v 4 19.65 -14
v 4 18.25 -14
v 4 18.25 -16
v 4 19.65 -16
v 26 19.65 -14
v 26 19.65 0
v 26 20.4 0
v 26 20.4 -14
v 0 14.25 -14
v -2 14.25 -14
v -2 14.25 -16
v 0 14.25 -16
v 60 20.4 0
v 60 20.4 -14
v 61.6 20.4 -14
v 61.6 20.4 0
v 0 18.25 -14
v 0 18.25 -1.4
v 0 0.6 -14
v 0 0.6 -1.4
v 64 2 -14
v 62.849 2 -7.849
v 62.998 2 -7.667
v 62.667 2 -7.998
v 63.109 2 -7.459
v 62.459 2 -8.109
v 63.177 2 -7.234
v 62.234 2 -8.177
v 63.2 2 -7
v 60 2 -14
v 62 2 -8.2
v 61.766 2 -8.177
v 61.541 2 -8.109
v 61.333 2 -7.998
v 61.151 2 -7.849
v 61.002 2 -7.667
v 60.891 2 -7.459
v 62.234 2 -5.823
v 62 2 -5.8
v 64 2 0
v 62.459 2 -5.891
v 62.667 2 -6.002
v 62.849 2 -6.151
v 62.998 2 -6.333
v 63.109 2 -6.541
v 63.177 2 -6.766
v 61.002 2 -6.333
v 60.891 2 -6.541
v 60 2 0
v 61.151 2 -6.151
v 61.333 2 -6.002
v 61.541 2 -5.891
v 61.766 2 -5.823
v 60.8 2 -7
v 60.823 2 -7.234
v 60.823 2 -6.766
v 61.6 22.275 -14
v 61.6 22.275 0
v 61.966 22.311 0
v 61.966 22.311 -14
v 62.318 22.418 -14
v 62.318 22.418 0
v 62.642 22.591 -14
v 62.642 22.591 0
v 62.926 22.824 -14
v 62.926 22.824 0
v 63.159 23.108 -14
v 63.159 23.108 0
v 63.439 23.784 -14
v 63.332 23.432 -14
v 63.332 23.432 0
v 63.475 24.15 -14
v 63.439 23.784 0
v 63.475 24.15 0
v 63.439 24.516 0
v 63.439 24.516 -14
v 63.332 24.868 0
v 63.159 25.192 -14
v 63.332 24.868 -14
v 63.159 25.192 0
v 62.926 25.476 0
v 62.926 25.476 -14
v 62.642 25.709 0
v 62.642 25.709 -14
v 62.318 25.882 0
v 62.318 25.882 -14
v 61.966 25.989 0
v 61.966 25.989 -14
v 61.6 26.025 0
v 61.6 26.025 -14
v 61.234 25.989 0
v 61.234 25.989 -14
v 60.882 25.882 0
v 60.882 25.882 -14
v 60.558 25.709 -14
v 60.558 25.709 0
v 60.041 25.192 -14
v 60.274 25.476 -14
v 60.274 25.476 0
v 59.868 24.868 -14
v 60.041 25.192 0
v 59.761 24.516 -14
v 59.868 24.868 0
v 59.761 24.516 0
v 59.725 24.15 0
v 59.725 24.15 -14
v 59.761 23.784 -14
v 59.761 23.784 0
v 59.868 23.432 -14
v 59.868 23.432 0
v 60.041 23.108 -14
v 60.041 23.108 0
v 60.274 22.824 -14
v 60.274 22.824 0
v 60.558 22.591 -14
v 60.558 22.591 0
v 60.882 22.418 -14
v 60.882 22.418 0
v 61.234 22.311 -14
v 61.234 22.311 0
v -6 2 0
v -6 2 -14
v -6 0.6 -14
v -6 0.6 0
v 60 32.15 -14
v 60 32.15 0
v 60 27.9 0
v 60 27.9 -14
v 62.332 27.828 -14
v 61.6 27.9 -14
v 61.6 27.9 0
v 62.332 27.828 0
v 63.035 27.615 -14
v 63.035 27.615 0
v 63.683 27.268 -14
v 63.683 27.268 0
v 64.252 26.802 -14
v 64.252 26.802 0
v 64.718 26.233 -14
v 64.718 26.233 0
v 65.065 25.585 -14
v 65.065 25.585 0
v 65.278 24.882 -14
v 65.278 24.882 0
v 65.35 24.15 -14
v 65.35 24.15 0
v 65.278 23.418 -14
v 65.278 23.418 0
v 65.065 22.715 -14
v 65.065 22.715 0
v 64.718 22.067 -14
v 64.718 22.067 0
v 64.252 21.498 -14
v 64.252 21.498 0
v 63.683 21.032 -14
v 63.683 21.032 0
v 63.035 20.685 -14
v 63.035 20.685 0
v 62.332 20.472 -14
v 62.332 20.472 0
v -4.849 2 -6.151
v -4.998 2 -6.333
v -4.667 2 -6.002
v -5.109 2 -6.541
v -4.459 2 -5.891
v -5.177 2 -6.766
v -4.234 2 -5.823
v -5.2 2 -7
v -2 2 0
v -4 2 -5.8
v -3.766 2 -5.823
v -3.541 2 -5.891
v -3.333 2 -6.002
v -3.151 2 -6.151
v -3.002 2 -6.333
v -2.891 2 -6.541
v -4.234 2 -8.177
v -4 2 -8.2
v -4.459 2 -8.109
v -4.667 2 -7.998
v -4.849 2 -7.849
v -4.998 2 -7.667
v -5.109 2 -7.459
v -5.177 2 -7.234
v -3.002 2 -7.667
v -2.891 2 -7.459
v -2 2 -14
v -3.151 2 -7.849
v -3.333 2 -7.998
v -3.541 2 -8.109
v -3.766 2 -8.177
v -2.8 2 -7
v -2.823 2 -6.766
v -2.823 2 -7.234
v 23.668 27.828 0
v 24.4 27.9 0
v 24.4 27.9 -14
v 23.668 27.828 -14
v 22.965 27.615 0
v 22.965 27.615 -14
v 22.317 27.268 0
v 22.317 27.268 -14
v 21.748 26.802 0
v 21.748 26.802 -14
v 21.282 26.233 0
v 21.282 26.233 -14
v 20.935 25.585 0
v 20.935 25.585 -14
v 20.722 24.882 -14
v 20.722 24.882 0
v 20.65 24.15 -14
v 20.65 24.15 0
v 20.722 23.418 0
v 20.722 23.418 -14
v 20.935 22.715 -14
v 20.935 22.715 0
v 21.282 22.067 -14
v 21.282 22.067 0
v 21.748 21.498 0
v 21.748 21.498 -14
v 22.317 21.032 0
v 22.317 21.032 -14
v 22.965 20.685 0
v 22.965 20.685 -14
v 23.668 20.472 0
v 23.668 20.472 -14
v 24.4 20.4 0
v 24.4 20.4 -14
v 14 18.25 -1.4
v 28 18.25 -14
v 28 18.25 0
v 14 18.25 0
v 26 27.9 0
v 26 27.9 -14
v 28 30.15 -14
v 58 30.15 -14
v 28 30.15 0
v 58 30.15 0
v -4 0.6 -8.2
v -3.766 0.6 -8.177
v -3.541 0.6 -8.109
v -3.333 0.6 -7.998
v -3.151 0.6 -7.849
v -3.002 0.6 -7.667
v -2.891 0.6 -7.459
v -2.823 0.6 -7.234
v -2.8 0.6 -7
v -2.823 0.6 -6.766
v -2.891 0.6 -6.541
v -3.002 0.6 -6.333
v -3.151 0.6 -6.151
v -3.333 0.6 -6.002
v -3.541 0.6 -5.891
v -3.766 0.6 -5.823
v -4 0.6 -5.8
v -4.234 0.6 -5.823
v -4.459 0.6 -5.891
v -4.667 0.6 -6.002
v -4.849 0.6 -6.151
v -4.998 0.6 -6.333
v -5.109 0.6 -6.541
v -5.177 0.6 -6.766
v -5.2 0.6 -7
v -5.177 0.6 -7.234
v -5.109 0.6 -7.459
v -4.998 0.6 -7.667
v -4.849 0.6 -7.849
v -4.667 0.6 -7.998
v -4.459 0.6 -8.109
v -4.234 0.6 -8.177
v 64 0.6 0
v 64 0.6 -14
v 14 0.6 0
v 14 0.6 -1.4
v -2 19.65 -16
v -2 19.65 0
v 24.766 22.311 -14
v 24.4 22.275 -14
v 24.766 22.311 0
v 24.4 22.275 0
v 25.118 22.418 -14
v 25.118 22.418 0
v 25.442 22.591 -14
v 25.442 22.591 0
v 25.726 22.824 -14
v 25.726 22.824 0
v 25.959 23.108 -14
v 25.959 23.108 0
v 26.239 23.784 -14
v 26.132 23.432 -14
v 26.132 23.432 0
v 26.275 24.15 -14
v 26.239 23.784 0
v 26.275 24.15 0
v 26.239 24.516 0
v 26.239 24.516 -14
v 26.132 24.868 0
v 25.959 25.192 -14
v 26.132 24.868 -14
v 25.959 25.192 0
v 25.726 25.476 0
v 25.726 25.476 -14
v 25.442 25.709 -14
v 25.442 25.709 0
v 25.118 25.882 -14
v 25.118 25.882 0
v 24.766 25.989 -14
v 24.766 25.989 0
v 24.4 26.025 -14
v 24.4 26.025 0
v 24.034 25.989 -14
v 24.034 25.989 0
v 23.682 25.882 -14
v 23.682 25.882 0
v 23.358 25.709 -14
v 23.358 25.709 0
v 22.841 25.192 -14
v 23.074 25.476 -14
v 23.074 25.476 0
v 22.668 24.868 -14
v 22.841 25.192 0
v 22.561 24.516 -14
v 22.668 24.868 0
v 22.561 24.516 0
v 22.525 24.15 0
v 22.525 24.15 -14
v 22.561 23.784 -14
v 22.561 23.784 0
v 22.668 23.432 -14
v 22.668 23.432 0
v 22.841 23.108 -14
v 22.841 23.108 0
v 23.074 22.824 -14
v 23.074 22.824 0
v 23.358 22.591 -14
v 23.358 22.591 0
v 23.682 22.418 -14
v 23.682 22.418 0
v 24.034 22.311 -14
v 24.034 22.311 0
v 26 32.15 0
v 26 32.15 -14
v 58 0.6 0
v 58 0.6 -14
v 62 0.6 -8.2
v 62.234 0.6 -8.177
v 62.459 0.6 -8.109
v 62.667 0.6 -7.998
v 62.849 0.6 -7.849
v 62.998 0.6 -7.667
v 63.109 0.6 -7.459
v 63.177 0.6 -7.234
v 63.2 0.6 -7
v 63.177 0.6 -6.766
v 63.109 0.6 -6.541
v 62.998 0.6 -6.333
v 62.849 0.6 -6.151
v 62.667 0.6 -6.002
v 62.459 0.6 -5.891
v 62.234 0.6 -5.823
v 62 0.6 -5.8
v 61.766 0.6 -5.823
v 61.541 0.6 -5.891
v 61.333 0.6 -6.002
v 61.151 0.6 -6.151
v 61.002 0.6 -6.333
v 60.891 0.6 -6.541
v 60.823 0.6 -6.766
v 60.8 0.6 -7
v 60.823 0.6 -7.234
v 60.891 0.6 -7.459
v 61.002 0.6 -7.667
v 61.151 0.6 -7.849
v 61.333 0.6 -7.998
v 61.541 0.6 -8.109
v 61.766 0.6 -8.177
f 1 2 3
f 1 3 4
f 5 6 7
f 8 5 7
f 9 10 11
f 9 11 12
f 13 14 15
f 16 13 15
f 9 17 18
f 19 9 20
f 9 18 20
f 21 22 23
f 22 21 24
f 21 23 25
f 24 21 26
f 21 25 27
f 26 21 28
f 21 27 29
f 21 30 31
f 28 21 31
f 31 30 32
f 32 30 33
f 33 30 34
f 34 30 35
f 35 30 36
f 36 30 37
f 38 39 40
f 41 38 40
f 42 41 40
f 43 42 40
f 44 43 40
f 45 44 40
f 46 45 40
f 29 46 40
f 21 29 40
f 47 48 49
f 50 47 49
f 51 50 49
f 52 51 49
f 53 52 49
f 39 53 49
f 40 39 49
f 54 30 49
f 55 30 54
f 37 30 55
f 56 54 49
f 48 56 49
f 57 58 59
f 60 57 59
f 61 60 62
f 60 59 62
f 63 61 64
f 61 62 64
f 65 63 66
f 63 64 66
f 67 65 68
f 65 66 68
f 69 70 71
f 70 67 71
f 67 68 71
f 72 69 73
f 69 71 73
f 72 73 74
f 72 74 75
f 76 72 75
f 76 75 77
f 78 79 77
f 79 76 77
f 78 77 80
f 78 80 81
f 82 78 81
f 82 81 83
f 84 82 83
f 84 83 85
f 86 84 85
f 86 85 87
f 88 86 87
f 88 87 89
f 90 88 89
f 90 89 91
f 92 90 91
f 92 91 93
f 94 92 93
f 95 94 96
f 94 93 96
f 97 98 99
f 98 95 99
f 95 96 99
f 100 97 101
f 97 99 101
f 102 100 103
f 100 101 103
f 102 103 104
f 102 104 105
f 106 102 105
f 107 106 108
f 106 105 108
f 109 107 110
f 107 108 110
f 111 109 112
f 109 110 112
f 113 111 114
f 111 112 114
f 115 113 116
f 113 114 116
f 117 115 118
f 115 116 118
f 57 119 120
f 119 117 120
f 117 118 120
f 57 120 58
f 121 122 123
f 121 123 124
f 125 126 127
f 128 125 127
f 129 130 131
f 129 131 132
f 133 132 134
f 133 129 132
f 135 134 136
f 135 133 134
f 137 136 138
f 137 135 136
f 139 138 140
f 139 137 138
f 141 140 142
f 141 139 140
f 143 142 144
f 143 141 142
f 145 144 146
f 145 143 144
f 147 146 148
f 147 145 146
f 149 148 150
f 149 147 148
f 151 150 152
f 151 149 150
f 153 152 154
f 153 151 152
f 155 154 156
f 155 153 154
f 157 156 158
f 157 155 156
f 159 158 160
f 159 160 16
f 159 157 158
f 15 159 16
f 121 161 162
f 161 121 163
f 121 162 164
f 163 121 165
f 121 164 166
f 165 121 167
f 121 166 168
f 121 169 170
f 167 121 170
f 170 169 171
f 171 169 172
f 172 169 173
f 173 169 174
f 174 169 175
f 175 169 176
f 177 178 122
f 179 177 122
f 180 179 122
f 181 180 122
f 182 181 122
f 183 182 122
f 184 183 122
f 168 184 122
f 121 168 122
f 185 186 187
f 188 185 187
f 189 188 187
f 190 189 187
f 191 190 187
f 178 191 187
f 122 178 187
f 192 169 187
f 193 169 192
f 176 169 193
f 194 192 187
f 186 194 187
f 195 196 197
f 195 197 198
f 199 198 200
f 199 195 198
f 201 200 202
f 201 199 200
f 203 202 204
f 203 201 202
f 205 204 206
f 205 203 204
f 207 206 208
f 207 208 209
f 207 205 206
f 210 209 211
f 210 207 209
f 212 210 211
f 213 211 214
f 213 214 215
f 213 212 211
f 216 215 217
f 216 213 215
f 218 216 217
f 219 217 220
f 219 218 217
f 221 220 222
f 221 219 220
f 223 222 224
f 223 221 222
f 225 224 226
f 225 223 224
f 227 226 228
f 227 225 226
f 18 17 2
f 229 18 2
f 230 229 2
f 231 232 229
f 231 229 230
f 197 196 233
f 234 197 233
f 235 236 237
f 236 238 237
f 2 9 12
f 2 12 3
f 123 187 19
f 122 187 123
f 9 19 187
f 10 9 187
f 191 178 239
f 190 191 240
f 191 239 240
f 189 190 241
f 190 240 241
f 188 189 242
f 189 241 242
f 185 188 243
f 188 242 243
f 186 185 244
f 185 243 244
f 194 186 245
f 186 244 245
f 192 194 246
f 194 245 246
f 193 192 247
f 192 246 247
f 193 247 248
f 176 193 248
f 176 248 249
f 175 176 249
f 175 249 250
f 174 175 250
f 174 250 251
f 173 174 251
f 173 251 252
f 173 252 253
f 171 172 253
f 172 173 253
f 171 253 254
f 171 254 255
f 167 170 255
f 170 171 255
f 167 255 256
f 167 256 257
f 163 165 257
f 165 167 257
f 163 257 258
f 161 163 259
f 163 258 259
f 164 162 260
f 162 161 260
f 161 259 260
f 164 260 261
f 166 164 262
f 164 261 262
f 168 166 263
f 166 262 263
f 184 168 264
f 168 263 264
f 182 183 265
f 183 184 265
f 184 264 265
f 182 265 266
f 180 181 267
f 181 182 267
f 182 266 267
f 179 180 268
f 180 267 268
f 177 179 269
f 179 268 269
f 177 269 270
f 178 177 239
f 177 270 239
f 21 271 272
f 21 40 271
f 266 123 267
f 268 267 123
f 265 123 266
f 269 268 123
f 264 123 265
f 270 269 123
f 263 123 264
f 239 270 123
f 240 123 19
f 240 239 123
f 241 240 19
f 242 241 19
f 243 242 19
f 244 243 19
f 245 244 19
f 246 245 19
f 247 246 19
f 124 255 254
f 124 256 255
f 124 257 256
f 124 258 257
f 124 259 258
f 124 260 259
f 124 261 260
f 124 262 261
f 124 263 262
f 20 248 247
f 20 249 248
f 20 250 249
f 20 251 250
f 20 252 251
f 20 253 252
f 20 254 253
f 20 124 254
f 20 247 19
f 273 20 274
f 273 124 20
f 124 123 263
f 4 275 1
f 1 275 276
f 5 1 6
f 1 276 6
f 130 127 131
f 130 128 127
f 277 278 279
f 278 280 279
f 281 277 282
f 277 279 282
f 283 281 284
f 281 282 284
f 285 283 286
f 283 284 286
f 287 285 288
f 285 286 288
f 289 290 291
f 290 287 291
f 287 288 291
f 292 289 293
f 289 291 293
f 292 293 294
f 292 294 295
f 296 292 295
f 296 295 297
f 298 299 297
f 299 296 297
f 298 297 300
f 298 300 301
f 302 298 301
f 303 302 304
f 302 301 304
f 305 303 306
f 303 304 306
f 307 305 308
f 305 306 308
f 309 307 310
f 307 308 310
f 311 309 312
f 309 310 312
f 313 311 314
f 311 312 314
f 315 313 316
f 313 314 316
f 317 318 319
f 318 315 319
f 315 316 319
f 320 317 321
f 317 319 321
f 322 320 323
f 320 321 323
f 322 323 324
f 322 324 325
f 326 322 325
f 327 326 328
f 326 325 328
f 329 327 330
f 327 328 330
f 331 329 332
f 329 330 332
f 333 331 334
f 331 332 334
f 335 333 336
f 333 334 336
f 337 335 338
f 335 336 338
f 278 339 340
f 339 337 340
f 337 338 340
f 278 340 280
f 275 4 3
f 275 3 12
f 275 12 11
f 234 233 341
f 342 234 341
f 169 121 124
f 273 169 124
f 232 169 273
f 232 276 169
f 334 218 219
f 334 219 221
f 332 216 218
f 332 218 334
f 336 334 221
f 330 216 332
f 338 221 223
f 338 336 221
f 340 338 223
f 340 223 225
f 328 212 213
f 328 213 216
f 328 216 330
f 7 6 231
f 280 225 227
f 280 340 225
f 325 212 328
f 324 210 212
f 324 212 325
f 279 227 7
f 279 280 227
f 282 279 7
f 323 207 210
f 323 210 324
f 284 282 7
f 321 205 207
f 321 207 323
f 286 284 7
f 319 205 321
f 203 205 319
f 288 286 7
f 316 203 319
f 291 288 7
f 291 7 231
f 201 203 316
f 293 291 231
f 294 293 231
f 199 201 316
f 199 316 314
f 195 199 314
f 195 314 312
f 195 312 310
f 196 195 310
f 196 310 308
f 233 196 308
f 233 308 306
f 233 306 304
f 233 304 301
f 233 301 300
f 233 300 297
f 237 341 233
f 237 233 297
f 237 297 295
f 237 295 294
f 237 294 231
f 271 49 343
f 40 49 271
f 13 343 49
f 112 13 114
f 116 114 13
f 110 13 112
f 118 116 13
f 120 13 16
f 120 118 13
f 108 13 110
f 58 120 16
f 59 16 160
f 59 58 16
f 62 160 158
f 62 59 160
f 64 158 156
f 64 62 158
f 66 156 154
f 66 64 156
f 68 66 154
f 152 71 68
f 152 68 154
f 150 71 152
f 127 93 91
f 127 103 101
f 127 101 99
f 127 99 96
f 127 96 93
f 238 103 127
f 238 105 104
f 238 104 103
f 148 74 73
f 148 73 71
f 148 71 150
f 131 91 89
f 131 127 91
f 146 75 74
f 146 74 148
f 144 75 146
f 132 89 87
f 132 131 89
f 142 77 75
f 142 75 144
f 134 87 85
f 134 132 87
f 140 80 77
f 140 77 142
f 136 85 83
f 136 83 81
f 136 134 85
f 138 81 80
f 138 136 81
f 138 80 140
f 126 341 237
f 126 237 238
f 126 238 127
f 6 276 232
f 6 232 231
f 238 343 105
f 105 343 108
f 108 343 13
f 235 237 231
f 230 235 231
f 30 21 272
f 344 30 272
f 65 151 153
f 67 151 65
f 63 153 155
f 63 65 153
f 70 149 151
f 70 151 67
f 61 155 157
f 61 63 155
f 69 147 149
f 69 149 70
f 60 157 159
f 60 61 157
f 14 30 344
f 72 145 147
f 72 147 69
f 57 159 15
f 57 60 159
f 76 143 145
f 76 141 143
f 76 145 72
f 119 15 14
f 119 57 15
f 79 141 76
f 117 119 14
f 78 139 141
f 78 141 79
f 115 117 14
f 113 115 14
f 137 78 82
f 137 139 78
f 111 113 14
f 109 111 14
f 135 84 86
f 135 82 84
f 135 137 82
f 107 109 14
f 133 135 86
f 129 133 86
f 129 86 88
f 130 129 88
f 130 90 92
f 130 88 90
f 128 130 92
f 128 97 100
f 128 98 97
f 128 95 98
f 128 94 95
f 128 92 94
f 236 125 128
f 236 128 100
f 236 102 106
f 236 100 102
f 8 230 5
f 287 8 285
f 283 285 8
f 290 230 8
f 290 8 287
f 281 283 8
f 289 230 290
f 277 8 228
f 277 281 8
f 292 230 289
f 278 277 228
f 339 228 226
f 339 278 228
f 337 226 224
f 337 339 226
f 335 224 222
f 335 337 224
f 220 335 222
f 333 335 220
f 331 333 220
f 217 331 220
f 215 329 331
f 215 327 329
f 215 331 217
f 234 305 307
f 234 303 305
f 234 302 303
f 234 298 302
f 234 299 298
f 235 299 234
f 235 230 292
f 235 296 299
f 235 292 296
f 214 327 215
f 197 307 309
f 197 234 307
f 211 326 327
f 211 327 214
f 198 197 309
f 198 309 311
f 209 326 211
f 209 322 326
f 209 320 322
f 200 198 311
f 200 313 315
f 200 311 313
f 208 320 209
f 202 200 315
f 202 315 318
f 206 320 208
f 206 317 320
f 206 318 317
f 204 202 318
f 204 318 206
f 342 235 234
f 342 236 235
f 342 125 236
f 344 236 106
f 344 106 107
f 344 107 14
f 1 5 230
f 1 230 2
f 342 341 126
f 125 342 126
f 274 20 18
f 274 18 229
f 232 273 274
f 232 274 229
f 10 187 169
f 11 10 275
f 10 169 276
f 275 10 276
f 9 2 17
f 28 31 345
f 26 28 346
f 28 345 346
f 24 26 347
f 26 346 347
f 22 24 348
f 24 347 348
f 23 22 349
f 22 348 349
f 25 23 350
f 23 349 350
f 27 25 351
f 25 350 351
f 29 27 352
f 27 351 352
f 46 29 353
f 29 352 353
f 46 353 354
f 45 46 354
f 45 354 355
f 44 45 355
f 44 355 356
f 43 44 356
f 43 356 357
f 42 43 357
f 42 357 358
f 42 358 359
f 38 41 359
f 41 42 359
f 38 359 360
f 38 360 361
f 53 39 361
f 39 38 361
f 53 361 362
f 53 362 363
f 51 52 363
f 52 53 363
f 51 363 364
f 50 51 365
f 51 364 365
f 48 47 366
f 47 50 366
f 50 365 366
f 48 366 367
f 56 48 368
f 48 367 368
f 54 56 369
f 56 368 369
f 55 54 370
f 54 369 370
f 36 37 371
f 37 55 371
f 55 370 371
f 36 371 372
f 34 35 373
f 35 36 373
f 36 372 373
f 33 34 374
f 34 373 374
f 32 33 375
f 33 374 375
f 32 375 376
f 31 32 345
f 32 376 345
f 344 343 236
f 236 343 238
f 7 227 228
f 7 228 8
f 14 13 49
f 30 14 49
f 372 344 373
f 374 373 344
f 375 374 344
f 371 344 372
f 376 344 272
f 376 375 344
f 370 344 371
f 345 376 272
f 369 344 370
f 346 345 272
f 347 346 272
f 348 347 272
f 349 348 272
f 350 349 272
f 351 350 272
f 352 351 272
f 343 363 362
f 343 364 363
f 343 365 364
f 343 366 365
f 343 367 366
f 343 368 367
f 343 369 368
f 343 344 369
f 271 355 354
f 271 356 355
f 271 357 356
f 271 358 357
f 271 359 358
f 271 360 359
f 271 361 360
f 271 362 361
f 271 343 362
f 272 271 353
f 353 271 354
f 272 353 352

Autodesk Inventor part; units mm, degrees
ref_plane "YZ Plane" through (0, 0, 0) normal (1, 0, 0) x (0, 1, 0)
ref_plane "XZ Plane" through (0, 0, 0) normal (0, 1, 0) x (-1, 0, 0)
ref_plane "XY Plane" through (0, 0, 0) normal (0, 0, 1) x (1, 0, 0)
sketch "スケッチ1" plane through (0, 0, 0) normal (0, 0, 1) x (1, 0, 0)
  line L0 (0, 0) -> (0, 17.65)
  line L1 (0, 17.65) -> (28, 17.65)
  line L2 (28, 17.65) -> (28, 30.15)
  line L3 (28, 30.15) -> (58, 30.15)
  line L4 (58, 30.15) -> (58, 0)
  line L5 (58, 0) -> (60, 0)
  line L6 (60, 0) -> (60, 32.15)
  line L7 (60, 32.15) -> (28, 32.15)
  line L8 (28, 32.15) -> (26, 32.15)
  line L9 (26, 32.15) -> (26, 19.65)
  line L10 (26, 19.65) -> (-2, 19.65)
  line L11 (-2, 19.65) -> (-2, 0)
  line L12 (-2, 0) -> (0, 0)
  dimension "d0" = 17.65
  dimension "d1" = 28
  dimension "d2" = 12.5
  dimension "d3" = 30
  dimension "d4" = 2
  dimension "d5" = 32.15
  dimension "d6" = 32
  dimension "d7" = 2
  dimension "d8" = 12.5
  dimension "d9" = 28
extrude "押し出し1" add sketch "スケッチ1" along normal blind 14
sketch "スケッチ2" plane through (60, 0, 0) normal (1, 0, 0) x (0, 0, -1)
  line L0 (0, 0) -> (-14, 0) projected
  line L1 (-14, 0) -> (0, 0)
  line L2 (0, 0) -> (0, 2)
  line L3 (0, 2) -> (-14, 2)
  line L4 (-14, 2) -> (-14, 0)
  dimension "d12" = 14
  dimension "d13" = 2
extrude "押し出し2" add sketch "スケッチ2" along normal blind 7
sketch "スケッチ3" plane through (-2, 0, 0) normal (-1, 0, 0) x (0, 0, 1)
  line L0 (14, 2) -> (0, 2) projected
  line L1 (0, 0) -> (14, 0)
  line L2 (14, 0) -> (14, 2)
  line L3 (14, 2) -> (0, 2)
  line L4 (0, 2) -> (0, 0)
  dimension "d16" = 14
extrude "押し出し3" add sketch "スケッチ3" along normal blind 7
sketch "スケッチ4" plane through (0, 0, 14) normal (0, 0, 1) x (1, 0, 0)
  line L0 (60, 32.15) -> (60, 24.15)
  line L1 (60, 24.15) -> (61.6, 24.15)
  arc A0 (61.6, 20.4) -> (61.6, 27.9) centre (61.6, 24.15) ccw
  line L2 (61.6, 24.15) -> (61.6, 20.4) construction
  line L3 (61.6, 24.15) -> (61.6, 27.9) construction
  line L4 (61.6, 27.9) -> (60, 27.9)
  line L5 (61.6, 20.4) -> (60, 20.4)
  line L6 (60, 2) -> (60, 32.15) projected
  line L7 (60, 27.9) -> (60, 20.4)
  point P0 (0, 0)
  dimension "d47" = 8
  dimension "d48" = 1.6
  dimension "d49" = 3.75
  dimension "d50" = 180
extrude "押し出し4" add sketch "スケッチ4" against normal blind 14
hole "穴3" at (61.6, 24.15, 14) direction (0, 0, -1) diameter 3.75 end through all
sketch "スケッチ7" plane through (0, 0, 14) normal (0, 0, 1) x (1, 0, 0)
  line L0 (60, 32.15) -> (26, 32.15) projected
  line L1 (26, 32.15) -> (26, 24.15)
  line L2 (26, 24.15) -> (24.4, 24.15)
  arc A0 (24.4, 27.9) -> (24.4, 20.4) centre (24.4, 24.15) ccw
  line L3 (24.4, 27.9) -> (26, 27.9)
  line L4 (24.4, 20.4) -> (26, 20.4)
  line L5 (26, 20.4) -> (26, 27.9)
  line L6 (26, 32.15) -> (26, 19.65) projected
  circle A1 centre (24.4, 24.15) radius 1.875
  point P0 (0, 0)
  dimension "d60" = 8
  dimension "d61" = 1.6
  dimension "d62" = 3.75
  dimension "d63" = 3.75
extrude "押し出し6" add sketch "スケッチ7" against normal blind 14 contours L1 A1 L5 L4 A0 L3 | L1 L5 A1 picked at (23.6929, 24.15)
hole "穴4" at (24.4, 24.15, 14) direction (0, 0, -1) diameter 3.75 end through all
sketch "スケッチ10" plane through (0, 17.65, 0) normal (0, -1, 0) x (1, 0, 0)
  line L0 (28, 14) -> (58, 14) projected
  line L1 (0, 0) -> (28, 0)
  line L2 (28, 0) -> (28, 14)
  line L3 (28, 14) -> (0, 14)
  line L4 (0, 14) -> (0, 0)
extrude "押し出し7" cut sketch "スケッチ10" against normal blind 0.6
sketch "スケッチ11" plane through (0, 0, 0) normal (0, -1, 0) x (1, 0, 0)
  line L0 (0, 14) -> (-9, 14) projected
  line L1 (60, 0) -> (67, 0) projected
  line L2 (-9, 14) -> (67, 14)
  line L3 (67, 14) -> (67, 0)
  line L4 (67, 0) -> (-9, 0)
  line L5 (-9, 0) -> (-9, 14)
  point P0 (0, 0)
extrude "押し出し8" cut sketch "スケッチ11" against normal blind 0.6
sketch "スケッチ12" plane through (0, 0, 14) normal (0, 0, 1) x (1, 0, 0)
  line L0 (-2, 19.65) -> (-2, 2) projected
  line L1 (-2, 19.65) -> (4, 19.65)
  line L2 (26, 19.65) -> (-2, 19.65) projected
  line L3 (4, 19.65) -> (4, 18.25)
  line L4 (0, 18.25) -> (28, 18.25) projected
  line L5 (4, 18.25) -> (0.2844, 14.5344)
  line L6 (4, 18.25) -> (9.2547, 18.25) construction
  line L7 (0.2844, 14.5344) -> (0, 14.25)
  line L8 (0, 0.6) -> (0, 18.25) projected
  line L9 (0, 14.25) -> (-2, 14.25)
  line L10 (-2, 14.25) -> (-2, 19.65)
  point P0 (0, 0)
  dimension "d79" = 6
  dimension "d80" = 135
extrude "押し出し9" add sketch "スケッチ12" along normal blind 2
sketch "スケッチ15" plane through (0, 0, 0) normal (0, 0, -1) x (-1, 0, 0)
  line L0 (0, 0.6) -> (0, 18.25) projected
  line L1 (0, 18.25) -> (-14, 18.25)
  line L2 (-14, 18.25) -> (-14, 0.6)
  line L3 (-14, 0.6) -> (0, 0.6)
  line L4 (0, 0.6) -> (0, 18.25)
  point P0 (0, 0)
  dimension "d88" = 14
extrude "押し出し11" add sketch "スケッチ15" against normal blind 1.4
sketch "スケッチ17" plane through (67, 0, 0) normal (1, 0, 0) x (0, 0, -1)
  line L0 (0, 0.6) -> (-14, 0.6) projected
  line L1 (0, 0.6) -> (-14, 0.6)
  line L2 (-14, 0.6) -> (-14, 9.5309)
  line L3 (-14, 9.5309) -> (0, 9.5309)
  line L4 (0, 9.5309) -> (0, 0.6)
  point P0 (0, 0)
extrude "押し出し13" cut sketch "スケッチ17" against normal blind 3
sketch "スケッチ18" plane through (-9, 0, 0) normal (-1, 0, 0) x (0, 0, 1)
  line L0 (0, 0.6) -> (14, 0.6) projected
  line L1 (0, 0.6) -> (14, 0.6)
  line L2 (14, 0.6) -> (14, 6.5)
  line L3 (14, 6.5) -> (0, 6.5)
  line L4 (0, 6.5) -> (0, 0.6)
  point P0 (0, 0)
extrude "押し出し14" cut sketch "スケッチ18" against normal blind 3
hole "穴5" at (-4, 2, 7) direction (0, -1, 0) diameter 2.4 end through all
hole "穴6" at (62, 2, 7) direction (0, -1, 0) diameter 2.4 end through all
mirror "ミラー1" about plane through (31.8158, 20.0509, 0) normal (0, 0, -1) of "押し出し3", "押し出し1", "押し出し4", "穴3", "押し出し2", "穴6", "穴4", "押し出し6", "押し出し7", "押し出し9", "押し出し11", "押し出し14", "押し出し13", "穴5", "押し出し8"
sketch "スケッチ19" plane through (0, 0, 14) normal (0, 0, 1) x (1, 0, 0)
  line L0 (94.8832, 81.412) -> (-62.365, 81.412)
  line L1 (-62.365, 81.412) -> (-62.365, -71.7744)
  line L2 (-62.365, -71.7744) -> (94.8832, -71.7744)
  line L3 (94.8832, -71.7744) -> (94.8832, 81.412)
  point P0 (0, 0)
extrude "押し出し15" cut sketch "スケッチ19" against normal blind 14
sketch "スケッチ20" plane through (-2, 19.65, 14) normal (0, 1, 0) x (1, 0, 0)
  line L0 (17.6833, -4.2941) -> (-12.6138, -4.2941)
  line L1 (-12.6138, -4.2941) -> (-12.6138, 1.0873)
  line L2 (-12.6138, 1.0873) -> (17.6833, 1.0873)
  line L3 (17.6833, 1.0873) -> (17.6833, -4.2941)
  point P0 (2, 14)
extrude "押し出し16" cut sketch "スケッチ20" against normal blind 14
properties part number "センサ冶具2個積み右"
